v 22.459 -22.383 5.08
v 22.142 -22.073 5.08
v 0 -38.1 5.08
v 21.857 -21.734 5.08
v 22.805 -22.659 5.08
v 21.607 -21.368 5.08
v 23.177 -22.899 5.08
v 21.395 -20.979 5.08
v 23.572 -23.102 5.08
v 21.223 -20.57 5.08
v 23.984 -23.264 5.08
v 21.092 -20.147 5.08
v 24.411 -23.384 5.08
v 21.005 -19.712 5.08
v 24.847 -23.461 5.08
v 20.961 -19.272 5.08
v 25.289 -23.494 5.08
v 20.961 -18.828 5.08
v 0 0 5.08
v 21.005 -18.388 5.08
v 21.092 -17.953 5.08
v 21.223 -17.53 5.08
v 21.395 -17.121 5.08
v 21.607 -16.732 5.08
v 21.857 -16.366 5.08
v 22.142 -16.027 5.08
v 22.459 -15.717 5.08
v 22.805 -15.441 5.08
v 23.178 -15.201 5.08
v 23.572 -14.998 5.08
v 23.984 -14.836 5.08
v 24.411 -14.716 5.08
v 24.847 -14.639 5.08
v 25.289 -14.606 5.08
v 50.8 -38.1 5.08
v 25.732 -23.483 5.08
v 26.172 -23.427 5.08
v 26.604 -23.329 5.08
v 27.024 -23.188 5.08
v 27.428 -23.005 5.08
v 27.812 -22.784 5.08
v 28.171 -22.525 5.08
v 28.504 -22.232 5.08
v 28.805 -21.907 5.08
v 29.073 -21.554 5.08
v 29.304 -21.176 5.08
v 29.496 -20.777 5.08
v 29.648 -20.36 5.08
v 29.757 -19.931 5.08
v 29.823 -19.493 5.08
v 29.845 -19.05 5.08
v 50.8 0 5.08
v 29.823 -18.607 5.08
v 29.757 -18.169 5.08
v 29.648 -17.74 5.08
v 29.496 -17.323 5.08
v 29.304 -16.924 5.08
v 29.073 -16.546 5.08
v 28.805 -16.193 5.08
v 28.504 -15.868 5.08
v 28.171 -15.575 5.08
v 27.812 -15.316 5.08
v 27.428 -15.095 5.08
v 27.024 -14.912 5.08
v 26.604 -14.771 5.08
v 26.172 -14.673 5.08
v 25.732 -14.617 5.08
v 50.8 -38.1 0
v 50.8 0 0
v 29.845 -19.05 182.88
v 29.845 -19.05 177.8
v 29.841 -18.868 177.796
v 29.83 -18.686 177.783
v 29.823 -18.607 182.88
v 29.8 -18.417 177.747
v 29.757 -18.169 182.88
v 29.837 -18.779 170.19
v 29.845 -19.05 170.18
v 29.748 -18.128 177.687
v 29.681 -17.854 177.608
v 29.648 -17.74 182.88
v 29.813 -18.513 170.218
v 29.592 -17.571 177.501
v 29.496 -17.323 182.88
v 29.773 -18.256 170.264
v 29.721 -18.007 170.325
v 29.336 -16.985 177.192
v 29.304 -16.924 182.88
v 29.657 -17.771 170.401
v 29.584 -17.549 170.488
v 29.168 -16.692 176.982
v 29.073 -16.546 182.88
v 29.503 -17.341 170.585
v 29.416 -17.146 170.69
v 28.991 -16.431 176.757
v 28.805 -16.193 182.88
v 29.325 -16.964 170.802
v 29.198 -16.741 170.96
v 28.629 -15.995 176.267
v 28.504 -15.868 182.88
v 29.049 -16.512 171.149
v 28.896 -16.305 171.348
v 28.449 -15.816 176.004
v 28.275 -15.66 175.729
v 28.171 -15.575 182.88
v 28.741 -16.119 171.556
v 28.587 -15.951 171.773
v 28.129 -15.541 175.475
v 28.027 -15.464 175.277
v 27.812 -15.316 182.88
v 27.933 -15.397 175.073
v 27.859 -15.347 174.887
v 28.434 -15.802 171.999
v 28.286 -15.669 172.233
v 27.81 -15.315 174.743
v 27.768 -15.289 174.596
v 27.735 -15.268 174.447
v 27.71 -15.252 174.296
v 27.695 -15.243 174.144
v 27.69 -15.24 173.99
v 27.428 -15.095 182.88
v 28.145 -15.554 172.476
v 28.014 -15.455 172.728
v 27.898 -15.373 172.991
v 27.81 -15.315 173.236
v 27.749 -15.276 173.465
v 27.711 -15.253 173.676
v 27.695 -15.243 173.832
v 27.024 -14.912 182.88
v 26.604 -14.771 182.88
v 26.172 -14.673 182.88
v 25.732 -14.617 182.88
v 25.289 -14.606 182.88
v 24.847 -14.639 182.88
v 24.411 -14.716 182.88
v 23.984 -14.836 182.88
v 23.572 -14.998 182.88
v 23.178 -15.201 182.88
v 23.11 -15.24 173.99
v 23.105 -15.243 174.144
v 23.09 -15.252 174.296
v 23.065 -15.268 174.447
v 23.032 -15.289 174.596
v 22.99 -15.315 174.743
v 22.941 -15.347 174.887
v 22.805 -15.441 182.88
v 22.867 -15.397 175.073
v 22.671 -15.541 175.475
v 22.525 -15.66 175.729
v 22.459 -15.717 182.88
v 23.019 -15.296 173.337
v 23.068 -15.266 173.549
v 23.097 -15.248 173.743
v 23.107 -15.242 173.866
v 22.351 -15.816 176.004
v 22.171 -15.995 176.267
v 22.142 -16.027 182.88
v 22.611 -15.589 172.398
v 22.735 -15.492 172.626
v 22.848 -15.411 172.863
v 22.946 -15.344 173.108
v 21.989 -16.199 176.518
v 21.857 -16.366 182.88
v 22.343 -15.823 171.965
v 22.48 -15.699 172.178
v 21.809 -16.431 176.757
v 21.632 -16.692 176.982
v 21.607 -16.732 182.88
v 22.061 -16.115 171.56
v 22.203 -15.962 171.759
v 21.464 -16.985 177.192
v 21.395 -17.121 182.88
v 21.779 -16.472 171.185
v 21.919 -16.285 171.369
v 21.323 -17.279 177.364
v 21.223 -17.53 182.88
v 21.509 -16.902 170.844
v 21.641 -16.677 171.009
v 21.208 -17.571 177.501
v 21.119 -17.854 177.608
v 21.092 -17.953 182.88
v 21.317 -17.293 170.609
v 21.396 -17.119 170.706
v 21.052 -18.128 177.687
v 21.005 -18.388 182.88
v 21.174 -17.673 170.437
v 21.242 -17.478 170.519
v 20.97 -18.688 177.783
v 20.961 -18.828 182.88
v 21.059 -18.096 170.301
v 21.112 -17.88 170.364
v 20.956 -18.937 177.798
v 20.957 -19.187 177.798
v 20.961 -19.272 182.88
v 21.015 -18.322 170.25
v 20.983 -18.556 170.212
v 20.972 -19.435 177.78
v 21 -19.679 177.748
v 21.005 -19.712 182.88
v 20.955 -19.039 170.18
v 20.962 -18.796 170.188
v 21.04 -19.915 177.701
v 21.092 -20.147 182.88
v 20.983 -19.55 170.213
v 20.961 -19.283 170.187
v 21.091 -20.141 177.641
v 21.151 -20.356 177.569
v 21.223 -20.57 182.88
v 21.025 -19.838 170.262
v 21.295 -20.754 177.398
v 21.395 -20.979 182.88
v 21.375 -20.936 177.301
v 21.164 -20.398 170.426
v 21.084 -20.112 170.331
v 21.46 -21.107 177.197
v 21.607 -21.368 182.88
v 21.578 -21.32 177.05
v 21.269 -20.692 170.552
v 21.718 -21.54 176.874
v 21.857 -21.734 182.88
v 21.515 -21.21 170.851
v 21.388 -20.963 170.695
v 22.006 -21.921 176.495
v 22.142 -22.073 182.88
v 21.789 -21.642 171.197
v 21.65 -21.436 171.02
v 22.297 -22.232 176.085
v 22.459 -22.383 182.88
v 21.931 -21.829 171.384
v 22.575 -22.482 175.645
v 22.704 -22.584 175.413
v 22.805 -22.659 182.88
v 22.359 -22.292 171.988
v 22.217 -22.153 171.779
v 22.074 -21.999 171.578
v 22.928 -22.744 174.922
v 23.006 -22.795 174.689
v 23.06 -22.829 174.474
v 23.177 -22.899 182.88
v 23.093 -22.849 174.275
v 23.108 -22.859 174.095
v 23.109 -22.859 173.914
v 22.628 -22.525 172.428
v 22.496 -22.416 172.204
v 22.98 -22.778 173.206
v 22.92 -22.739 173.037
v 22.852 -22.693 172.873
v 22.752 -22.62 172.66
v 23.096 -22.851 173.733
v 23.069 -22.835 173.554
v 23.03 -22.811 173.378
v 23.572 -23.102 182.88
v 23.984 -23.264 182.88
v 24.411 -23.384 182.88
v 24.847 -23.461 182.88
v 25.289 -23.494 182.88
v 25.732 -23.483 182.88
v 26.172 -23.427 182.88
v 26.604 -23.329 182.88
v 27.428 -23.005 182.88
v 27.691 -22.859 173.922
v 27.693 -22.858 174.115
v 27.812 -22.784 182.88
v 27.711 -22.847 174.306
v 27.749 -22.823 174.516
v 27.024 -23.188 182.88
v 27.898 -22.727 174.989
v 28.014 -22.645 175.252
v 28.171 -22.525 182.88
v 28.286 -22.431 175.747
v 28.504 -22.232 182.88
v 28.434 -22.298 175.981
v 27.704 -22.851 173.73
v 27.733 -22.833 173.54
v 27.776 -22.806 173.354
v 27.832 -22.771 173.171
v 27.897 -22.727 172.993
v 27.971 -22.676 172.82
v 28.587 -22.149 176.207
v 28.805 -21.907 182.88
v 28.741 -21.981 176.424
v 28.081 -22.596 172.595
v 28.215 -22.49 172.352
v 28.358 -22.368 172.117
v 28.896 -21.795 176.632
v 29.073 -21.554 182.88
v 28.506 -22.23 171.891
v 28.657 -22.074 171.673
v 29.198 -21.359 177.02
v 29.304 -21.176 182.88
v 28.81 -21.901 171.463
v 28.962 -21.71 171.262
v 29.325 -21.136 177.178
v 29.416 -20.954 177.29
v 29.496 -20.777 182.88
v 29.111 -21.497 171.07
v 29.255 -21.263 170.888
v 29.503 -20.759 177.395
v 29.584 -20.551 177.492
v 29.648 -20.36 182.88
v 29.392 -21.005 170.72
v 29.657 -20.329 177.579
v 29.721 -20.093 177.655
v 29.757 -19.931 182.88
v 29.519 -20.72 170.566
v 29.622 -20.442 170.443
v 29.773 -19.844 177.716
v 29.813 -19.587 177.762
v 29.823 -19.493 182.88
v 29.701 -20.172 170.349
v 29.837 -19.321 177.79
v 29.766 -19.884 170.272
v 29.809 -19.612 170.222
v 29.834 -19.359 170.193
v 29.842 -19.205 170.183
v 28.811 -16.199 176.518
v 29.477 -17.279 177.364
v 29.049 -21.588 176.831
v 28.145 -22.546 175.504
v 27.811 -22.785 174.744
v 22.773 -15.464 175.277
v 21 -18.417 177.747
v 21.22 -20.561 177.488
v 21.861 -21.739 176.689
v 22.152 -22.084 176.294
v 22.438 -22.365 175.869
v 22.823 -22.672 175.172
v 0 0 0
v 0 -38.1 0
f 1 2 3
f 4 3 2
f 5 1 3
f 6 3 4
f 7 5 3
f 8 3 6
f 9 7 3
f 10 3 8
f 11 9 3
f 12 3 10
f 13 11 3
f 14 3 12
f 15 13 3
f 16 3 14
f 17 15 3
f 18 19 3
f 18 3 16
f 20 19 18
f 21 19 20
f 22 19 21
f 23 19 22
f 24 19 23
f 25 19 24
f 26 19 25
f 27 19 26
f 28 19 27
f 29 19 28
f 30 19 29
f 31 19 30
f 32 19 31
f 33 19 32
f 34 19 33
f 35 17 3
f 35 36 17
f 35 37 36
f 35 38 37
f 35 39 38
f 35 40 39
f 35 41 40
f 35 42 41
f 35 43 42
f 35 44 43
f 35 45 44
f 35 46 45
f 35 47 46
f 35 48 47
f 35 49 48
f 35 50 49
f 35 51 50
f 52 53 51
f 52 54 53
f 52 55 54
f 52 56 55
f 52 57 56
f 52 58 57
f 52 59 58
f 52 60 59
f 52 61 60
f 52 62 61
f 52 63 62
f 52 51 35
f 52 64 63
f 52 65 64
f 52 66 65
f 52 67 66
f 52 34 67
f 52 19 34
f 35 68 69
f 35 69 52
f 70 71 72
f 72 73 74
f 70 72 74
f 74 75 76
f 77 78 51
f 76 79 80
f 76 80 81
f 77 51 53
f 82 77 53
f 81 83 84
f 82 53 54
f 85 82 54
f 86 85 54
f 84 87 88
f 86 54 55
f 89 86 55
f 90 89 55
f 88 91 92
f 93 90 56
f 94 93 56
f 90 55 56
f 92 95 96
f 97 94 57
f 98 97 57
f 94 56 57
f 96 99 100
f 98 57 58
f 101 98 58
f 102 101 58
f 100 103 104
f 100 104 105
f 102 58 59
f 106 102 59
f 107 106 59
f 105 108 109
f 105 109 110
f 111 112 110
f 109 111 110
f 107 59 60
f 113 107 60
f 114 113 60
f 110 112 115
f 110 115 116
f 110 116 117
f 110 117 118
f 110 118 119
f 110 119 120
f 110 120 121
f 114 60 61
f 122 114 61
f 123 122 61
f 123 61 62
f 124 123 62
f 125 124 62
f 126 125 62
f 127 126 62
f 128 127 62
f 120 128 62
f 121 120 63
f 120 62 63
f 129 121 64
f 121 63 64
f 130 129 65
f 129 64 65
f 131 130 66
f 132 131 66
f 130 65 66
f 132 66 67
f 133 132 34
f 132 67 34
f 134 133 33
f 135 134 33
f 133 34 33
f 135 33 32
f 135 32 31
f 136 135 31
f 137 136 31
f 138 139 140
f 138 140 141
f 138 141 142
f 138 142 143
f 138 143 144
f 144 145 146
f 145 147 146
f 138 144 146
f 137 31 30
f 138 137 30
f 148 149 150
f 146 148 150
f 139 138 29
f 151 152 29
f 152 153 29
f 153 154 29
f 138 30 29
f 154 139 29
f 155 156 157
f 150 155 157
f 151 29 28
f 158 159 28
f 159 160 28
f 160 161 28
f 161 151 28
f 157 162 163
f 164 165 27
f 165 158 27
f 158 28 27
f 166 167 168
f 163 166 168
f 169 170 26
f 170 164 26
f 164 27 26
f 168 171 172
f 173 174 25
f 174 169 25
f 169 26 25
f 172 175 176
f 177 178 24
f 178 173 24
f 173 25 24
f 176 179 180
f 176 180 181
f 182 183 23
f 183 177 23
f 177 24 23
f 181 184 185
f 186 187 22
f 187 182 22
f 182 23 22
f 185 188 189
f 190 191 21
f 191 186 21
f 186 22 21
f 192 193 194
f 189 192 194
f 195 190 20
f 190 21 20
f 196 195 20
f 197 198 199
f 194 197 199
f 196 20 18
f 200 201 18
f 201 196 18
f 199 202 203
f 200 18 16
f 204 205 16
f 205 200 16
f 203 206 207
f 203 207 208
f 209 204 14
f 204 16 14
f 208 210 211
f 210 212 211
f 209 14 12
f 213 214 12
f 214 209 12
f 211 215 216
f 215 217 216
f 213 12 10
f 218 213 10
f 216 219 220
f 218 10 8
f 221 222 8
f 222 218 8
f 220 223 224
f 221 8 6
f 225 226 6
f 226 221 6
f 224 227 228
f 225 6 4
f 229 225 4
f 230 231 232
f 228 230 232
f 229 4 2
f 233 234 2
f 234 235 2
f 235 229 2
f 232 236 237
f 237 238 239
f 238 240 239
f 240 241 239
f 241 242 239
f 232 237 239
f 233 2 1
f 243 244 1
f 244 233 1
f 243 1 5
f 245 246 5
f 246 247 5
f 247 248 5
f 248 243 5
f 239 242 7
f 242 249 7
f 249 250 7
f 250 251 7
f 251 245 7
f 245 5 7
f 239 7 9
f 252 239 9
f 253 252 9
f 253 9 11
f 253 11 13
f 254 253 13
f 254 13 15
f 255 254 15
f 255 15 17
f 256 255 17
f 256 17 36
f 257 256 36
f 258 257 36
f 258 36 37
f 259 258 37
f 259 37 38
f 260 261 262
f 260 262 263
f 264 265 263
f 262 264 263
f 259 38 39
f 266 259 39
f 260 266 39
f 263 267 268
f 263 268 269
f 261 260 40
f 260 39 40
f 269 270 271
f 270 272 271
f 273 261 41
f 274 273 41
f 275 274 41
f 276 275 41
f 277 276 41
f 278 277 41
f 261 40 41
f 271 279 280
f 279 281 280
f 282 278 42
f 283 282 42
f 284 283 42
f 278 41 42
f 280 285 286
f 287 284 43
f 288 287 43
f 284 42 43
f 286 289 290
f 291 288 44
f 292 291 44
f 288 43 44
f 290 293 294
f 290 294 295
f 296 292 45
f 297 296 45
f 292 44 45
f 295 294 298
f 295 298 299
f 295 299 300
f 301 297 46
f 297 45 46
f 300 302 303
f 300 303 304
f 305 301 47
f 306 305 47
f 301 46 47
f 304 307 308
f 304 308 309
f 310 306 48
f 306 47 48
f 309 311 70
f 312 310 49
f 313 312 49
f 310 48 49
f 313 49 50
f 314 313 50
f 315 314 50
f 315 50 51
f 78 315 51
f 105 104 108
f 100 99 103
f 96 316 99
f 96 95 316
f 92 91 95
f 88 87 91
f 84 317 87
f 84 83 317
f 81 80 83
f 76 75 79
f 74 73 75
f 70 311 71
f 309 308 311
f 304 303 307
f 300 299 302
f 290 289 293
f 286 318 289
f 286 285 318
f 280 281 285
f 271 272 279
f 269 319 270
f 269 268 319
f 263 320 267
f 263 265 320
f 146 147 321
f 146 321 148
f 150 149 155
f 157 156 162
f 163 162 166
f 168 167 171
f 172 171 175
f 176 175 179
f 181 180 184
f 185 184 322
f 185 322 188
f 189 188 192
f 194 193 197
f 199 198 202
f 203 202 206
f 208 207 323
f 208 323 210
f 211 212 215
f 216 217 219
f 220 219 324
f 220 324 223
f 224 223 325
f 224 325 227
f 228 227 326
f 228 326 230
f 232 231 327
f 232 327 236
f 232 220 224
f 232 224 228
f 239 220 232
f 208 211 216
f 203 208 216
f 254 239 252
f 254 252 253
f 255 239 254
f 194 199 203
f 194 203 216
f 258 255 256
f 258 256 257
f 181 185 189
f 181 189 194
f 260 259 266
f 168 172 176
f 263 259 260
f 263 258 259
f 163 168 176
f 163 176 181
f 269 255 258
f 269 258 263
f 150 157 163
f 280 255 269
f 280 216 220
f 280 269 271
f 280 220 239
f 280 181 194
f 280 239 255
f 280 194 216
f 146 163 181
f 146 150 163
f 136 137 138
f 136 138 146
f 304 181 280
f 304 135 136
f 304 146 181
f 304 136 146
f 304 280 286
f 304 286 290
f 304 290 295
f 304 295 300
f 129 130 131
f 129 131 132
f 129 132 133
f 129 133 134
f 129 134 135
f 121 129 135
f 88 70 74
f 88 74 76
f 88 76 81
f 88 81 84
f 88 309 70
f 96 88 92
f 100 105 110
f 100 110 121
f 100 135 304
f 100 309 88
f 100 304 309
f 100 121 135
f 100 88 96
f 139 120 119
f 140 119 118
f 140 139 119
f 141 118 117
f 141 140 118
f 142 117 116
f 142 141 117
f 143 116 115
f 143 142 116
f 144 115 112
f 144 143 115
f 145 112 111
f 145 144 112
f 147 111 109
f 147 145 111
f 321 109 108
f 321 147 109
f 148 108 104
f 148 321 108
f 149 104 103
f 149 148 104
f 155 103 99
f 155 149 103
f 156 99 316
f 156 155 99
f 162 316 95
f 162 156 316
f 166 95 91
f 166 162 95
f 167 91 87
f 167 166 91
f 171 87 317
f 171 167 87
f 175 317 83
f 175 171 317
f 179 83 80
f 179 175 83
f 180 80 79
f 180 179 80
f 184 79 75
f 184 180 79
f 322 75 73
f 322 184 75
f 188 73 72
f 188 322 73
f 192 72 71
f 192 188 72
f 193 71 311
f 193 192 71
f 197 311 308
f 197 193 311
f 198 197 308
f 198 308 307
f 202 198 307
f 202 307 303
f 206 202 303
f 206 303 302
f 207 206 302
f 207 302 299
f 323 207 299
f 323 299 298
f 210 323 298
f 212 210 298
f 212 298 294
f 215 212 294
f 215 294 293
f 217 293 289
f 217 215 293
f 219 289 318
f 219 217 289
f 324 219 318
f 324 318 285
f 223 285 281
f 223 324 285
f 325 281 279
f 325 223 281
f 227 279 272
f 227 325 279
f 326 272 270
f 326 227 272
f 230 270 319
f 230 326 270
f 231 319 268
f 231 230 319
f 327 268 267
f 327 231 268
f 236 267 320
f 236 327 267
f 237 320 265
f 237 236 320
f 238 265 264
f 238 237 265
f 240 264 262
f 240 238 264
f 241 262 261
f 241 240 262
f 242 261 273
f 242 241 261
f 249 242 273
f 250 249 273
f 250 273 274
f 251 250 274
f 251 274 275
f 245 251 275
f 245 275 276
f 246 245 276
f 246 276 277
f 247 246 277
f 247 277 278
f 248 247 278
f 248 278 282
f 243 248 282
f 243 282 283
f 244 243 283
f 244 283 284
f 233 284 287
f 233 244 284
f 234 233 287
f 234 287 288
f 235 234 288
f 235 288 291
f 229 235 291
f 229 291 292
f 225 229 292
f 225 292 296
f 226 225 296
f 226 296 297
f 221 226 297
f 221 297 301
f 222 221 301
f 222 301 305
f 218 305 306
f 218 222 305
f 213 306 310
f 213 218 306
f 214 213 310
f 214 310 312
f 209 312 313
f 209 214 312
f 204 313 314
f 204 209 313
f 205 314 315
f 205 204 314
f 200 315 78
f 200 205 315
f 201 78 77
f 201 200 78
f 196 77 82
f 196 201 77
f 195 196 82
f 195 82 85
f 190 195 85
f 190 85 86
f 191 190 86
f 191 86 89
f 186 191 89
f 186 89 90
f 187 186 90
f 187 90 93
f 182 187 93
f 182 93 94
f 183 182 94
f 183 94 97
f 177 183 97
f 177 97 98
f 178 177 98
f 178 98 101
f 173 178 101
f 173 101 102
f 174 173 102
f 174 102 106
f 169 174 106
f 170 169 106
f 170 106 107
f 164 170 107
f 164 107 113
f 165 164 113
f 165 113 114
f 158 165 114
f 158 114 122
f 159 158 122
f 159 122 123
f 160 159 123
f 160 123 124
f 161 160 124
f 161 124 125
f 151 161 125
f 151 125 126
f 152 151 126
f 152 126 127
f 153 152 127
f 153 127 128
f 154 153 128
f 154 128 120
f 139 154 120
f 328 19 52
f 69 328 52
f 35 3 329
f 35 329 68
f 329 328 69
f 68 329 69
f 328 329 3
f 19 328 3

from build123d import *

# Parameters (mm, degrees)
F0_W     = 50.8
F0_H     = 5.08
F1_DEPTH = 38.1
F2_R     = 4.445
F3_DEPTH = 177.8
F4_R     = 3.81
F5_DEPTH = 50.673


with BuildPart() as f1:
    # F0 (on Front) → F1 (new body)
    with BuildSketch(Plane.XZ):
        with Locations((25.4, 2.54)):
            Rectangle(F0_W, F0_H)
    extrude(amount=F1_DEPTH)

    # F2 (on face) → F3 (join)
    with BuildSketch(Plane.XY.offset(5.08)):
        with Locations((25.4, -19.05)):
            Circle(F2_R)
    extrude(amount=F3_DEPTH)

    # F4 (on Right) → F5 (cut)
    with BuildSketch(Plane.YZ):
        with Locations((-19.05, 173.99)):
            Circle(F4_R)
    extrude(amount=F5_DEPTH, mode=Mode.SUBTRACT)


solid = f1.part
